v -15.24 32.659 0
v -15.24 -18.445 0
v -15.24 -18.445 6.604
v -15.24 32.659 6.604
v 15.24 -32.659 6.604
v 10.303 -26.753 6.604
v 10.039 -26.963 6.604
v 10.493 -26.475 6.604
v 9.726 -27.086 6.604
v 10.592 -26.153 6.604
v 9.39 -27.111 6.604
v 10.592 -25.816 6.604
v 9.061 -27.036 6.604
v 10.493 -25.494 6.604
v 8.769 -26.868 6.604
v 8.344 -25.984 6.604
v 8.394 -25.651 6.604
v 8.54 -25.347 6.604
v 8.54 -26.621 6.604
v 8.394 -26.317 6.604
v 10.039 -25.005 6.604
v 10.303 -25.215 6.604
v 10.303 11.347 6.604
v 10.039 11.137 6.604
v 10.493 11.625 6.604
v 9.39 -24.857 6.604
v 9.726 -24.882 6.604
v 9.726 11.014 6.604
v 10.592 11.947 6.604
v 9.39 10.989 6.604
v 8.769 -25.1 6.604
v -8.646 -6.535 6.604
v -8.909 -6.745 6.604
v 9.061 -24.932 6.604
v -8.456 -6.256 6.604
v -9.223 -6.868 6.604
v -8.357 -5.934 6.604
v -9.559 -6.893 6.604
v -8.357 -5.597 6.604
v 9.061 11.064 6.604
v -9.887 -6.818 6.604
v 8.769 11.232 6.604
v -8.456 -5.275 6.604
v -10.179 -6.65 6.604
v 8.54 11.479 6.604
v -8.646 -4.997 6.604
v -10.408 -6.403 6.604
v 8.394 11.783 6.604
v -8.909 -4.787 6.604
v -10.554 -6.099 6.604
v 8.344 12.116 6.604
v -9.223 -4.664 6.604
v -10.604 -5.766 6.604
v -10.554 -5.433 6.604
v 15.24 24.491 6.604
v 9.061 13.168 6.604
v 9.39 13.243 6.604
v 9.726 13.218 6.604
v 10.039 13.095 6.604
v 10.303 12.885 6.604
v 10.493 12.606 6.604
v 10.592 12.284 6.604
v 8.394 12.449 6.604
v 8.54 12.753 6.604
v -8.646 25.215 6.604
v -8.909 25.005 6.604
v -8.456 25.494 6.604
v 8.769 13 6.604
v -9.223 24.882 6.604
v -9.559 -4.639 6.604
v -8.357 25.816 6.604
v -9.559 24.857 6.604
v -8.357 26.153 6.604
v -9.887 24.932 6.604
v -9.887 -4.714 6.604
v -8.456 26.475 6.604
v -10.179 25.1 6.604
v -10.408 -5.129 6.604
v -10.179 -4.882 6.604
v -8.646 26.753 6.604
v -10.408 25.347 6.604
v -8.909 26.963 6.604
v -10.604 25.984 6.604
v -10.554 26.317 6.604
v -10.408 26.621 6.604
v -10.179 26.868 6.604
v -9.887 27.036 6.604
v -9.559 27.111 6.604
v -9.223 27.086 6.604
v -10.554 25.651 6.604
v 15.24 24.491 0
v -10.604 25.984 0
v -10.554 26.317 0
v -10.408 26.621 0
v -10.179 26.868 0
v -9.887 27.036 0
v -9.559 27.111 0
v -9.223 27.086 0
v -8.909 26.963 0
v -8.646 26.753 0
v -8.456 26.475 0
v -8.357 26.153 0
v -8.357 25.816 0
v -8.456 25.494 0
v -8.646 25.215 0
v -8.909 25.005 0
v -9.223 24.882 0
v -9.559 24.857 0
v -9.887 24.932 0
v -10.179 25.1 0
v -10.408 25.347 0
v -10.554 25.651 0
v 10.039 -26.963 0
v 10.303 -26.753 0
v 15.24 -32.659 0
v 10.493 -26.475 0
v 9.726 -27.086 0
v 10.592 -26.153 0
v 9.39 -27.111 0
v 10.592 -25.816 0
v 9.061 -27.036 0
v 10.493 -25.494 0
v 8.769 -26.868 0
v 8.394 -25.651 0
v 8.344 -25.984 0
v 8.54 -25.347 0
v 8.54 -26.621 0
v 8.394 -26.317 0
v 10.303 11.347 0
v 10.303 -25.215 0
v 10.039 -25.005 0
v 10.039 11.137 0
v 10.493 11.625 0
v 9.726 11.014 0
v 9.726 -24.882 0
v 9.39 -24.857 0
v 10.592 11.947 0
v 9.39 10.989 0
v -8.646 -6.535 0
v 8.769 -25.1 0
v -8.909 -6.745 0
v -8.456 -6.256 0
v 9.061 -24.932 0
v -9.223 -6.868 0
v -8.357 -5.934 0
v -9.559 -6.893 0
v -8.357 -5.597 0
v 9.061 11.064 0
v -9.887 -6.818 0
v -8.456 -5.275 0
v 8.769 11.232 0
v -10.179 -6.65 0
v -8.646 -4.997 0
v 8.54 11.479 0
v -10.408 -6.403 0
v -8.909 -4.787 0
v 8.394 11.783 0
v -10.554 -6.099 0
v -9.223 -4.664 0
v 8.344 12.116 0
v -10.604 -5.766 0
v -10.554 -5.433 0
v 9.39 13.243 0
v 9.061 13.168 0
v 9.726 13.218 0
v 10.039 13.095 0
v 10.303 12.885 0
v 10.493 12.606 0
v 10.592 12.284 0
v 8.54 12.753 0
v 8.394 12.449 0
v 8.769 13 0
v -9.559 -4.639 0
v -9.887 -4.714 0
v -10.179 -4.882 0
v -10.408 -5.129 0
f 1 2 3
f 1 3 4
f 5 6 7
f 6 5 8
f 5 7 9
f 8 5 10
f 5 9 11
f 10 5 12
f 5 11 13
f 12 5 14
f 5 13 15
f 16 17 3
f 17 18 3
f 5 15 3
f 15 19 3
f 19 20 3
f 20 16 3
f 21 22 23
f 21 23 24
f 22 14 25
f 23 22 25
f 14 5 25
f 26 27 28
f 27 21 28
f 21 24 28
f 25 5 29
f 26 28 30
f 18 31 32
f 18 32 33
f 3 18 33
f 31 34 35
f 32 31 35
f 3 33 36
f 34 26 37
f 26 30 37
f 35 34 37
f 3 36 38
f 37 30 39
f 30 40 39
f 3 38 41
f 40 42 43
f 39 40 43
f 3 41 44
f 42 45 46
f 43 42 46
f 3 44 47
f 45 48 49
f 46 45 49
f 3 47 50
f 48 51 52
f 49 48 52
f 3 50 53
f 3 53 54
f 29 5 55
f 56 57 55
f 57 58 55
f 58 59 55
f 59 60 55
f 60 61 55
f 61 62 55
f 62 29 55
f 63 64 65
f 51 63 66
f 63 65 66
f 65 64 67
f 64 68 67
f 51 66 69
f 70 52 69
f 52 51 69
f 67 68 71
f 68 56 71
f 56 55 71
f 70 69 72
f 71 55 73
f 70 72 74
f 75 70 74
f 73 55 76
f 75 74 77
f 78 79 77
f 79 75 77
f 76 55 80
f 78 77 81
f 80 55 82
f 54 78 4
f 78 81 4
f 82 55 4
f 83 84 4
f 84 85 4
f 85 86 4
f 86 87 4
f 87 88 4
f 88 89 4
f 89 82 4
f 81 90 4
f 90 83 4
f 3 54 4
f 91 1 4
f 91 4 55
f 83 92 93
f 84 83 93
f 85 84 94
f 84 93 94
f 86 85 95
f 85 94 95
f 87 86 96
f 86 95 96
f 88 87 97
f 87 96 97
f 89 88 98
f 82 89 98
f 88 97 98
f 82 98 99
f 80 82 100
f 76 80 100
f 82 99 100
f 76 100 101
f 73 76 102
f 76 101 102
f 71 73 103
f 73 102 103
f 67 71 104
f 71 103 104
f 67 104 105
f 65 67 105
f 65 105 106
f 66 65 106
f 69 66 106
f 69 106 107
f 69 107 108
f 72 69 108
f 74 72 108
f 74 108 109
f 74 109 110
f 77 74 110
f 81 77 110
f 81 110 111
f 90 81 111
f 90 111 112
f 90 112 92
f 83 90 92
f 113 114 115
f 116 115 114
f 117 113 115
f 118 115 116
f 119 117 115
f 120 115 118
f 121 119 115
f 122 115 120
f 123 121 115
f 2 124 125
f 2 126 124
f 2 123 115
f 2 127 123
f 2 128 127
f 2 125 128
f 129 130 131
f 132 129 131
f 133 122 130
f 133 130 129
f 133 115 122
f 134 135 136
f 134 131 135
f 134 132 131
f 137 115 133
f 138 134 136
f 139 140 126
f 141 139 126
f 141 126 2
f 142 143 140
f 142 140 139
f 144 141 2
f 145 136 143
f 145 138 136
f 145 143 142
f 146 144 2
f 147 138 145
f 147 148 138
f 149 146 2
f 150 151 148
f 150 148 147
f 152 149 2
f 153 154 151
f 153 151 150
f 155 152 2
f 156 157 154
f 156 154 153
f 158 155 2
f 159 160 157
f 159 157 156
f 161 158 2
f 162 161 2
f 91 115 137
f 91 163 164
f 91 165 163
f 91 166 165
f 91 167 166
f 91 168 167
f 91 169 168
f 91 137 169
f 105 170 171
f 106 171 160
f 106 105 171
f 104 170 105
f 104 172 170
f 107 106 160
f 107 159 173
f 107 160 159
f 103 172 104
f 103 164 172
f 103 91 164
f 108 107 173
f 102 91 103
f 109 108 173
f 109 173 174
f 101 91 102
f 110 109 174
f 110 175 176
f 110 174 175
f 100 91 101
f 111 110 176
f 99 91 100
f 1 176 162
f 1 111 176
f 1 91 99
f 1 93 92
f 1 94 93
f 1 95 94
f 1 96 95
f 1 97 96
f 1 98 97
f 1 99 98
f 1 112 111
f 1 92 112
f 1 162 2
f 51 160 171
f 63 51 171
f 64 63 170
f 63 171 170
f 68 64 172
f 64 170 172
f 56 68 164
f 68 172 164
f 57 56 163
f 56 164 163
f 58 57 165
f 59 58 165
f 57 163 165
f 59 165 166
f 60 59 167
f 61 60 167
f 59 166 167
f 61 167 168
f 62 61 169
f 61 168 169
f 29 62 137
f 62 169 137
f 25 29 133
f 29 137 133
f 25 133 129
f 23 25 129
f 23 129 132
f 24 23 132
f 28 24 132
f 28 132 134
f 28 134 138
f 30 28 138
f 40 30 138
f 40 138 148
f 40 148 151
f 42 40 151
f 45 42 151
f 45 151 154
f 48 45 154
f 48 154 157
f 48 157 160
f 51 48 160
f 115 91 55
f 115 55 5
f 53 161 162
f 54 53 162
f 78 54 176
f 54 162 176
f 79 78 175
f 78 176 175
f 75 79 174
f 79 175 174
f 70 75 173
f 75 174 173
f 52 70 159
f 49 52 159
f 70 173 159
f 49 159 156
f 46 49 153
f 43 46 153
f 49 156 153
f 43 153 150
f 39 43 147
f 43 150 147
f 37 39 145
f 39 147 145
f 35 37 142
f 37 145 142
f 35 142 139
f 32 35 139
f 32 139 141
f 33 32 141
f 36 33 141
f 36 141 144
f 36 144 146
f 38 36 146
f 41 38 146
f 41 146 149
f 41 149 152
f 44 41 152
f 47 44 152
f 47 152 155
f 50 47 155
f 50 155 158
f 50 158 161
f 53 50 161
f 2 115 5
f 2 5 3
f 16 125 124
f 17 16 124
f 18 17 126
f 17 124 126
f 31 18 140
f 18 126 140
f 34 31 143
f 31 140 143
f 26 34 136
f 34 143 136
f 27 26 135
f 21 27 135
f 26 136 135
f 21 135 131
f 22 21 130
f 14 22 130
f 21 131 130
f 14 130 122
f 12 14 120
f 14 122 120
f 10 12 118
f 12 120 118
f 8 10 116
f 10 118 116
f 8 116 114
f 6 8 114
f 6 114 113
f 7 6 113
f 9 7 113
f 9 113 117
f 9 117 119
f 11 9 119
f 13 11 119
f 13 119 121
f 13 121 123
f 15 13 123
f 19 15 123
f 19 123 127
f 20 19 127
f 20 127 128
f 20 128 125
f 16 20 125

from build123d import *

# Parameters (mm, degrees)
BOSS_EXTRUDE1_DEPTH       = 6.604
F_4_40_TAPPED_HOLE1_D     = 2.2606
F_4_40_TAPPED_HOLE1_DEPTH = 7.5946
F_4_40_TAPPED_HOLE1_TIP   = 0.679152758


with BuildPart() as part:
    # Sketch1 → Boss-Extrude1 (new body)
    with BuildSketch(Plane.XY):
        Polygon((15.24, -32.658545693), (-15.24, -18.445488272), (-15.24, 32.658545693), (15.24, 24.491454307), align=None)
    extrude(amount=BOSS_EXTRUDE1_DEPTH)

    # #4-40 Tapped Hole1
    with Locations(Plane.XY.offset(6.604)):
        with Locations((-9.4742, 25.9842), (9.4742, 12.1158), (-9.4742, -5.7658), (9.4742, -25.9842)):
            Hole(F_4_40_TAPPED_HOLE1_D / 2, depth=F_4_40_TAPPED_HOLE1_DEPTH)
            with Locations((0, 0, -(F_4_40_TAPPED_HOLE1_DEPTH + F_4_40_TAPPED_HOLE1_TIP / 2))):  # 118° drill point
                Cone(0, F_4_40_TAPPED_HOLE1_D / 2, F_4_40_TAPPED_HOLE1_TIP, mode=Mode.SUBTRACT)


solid = part.part
